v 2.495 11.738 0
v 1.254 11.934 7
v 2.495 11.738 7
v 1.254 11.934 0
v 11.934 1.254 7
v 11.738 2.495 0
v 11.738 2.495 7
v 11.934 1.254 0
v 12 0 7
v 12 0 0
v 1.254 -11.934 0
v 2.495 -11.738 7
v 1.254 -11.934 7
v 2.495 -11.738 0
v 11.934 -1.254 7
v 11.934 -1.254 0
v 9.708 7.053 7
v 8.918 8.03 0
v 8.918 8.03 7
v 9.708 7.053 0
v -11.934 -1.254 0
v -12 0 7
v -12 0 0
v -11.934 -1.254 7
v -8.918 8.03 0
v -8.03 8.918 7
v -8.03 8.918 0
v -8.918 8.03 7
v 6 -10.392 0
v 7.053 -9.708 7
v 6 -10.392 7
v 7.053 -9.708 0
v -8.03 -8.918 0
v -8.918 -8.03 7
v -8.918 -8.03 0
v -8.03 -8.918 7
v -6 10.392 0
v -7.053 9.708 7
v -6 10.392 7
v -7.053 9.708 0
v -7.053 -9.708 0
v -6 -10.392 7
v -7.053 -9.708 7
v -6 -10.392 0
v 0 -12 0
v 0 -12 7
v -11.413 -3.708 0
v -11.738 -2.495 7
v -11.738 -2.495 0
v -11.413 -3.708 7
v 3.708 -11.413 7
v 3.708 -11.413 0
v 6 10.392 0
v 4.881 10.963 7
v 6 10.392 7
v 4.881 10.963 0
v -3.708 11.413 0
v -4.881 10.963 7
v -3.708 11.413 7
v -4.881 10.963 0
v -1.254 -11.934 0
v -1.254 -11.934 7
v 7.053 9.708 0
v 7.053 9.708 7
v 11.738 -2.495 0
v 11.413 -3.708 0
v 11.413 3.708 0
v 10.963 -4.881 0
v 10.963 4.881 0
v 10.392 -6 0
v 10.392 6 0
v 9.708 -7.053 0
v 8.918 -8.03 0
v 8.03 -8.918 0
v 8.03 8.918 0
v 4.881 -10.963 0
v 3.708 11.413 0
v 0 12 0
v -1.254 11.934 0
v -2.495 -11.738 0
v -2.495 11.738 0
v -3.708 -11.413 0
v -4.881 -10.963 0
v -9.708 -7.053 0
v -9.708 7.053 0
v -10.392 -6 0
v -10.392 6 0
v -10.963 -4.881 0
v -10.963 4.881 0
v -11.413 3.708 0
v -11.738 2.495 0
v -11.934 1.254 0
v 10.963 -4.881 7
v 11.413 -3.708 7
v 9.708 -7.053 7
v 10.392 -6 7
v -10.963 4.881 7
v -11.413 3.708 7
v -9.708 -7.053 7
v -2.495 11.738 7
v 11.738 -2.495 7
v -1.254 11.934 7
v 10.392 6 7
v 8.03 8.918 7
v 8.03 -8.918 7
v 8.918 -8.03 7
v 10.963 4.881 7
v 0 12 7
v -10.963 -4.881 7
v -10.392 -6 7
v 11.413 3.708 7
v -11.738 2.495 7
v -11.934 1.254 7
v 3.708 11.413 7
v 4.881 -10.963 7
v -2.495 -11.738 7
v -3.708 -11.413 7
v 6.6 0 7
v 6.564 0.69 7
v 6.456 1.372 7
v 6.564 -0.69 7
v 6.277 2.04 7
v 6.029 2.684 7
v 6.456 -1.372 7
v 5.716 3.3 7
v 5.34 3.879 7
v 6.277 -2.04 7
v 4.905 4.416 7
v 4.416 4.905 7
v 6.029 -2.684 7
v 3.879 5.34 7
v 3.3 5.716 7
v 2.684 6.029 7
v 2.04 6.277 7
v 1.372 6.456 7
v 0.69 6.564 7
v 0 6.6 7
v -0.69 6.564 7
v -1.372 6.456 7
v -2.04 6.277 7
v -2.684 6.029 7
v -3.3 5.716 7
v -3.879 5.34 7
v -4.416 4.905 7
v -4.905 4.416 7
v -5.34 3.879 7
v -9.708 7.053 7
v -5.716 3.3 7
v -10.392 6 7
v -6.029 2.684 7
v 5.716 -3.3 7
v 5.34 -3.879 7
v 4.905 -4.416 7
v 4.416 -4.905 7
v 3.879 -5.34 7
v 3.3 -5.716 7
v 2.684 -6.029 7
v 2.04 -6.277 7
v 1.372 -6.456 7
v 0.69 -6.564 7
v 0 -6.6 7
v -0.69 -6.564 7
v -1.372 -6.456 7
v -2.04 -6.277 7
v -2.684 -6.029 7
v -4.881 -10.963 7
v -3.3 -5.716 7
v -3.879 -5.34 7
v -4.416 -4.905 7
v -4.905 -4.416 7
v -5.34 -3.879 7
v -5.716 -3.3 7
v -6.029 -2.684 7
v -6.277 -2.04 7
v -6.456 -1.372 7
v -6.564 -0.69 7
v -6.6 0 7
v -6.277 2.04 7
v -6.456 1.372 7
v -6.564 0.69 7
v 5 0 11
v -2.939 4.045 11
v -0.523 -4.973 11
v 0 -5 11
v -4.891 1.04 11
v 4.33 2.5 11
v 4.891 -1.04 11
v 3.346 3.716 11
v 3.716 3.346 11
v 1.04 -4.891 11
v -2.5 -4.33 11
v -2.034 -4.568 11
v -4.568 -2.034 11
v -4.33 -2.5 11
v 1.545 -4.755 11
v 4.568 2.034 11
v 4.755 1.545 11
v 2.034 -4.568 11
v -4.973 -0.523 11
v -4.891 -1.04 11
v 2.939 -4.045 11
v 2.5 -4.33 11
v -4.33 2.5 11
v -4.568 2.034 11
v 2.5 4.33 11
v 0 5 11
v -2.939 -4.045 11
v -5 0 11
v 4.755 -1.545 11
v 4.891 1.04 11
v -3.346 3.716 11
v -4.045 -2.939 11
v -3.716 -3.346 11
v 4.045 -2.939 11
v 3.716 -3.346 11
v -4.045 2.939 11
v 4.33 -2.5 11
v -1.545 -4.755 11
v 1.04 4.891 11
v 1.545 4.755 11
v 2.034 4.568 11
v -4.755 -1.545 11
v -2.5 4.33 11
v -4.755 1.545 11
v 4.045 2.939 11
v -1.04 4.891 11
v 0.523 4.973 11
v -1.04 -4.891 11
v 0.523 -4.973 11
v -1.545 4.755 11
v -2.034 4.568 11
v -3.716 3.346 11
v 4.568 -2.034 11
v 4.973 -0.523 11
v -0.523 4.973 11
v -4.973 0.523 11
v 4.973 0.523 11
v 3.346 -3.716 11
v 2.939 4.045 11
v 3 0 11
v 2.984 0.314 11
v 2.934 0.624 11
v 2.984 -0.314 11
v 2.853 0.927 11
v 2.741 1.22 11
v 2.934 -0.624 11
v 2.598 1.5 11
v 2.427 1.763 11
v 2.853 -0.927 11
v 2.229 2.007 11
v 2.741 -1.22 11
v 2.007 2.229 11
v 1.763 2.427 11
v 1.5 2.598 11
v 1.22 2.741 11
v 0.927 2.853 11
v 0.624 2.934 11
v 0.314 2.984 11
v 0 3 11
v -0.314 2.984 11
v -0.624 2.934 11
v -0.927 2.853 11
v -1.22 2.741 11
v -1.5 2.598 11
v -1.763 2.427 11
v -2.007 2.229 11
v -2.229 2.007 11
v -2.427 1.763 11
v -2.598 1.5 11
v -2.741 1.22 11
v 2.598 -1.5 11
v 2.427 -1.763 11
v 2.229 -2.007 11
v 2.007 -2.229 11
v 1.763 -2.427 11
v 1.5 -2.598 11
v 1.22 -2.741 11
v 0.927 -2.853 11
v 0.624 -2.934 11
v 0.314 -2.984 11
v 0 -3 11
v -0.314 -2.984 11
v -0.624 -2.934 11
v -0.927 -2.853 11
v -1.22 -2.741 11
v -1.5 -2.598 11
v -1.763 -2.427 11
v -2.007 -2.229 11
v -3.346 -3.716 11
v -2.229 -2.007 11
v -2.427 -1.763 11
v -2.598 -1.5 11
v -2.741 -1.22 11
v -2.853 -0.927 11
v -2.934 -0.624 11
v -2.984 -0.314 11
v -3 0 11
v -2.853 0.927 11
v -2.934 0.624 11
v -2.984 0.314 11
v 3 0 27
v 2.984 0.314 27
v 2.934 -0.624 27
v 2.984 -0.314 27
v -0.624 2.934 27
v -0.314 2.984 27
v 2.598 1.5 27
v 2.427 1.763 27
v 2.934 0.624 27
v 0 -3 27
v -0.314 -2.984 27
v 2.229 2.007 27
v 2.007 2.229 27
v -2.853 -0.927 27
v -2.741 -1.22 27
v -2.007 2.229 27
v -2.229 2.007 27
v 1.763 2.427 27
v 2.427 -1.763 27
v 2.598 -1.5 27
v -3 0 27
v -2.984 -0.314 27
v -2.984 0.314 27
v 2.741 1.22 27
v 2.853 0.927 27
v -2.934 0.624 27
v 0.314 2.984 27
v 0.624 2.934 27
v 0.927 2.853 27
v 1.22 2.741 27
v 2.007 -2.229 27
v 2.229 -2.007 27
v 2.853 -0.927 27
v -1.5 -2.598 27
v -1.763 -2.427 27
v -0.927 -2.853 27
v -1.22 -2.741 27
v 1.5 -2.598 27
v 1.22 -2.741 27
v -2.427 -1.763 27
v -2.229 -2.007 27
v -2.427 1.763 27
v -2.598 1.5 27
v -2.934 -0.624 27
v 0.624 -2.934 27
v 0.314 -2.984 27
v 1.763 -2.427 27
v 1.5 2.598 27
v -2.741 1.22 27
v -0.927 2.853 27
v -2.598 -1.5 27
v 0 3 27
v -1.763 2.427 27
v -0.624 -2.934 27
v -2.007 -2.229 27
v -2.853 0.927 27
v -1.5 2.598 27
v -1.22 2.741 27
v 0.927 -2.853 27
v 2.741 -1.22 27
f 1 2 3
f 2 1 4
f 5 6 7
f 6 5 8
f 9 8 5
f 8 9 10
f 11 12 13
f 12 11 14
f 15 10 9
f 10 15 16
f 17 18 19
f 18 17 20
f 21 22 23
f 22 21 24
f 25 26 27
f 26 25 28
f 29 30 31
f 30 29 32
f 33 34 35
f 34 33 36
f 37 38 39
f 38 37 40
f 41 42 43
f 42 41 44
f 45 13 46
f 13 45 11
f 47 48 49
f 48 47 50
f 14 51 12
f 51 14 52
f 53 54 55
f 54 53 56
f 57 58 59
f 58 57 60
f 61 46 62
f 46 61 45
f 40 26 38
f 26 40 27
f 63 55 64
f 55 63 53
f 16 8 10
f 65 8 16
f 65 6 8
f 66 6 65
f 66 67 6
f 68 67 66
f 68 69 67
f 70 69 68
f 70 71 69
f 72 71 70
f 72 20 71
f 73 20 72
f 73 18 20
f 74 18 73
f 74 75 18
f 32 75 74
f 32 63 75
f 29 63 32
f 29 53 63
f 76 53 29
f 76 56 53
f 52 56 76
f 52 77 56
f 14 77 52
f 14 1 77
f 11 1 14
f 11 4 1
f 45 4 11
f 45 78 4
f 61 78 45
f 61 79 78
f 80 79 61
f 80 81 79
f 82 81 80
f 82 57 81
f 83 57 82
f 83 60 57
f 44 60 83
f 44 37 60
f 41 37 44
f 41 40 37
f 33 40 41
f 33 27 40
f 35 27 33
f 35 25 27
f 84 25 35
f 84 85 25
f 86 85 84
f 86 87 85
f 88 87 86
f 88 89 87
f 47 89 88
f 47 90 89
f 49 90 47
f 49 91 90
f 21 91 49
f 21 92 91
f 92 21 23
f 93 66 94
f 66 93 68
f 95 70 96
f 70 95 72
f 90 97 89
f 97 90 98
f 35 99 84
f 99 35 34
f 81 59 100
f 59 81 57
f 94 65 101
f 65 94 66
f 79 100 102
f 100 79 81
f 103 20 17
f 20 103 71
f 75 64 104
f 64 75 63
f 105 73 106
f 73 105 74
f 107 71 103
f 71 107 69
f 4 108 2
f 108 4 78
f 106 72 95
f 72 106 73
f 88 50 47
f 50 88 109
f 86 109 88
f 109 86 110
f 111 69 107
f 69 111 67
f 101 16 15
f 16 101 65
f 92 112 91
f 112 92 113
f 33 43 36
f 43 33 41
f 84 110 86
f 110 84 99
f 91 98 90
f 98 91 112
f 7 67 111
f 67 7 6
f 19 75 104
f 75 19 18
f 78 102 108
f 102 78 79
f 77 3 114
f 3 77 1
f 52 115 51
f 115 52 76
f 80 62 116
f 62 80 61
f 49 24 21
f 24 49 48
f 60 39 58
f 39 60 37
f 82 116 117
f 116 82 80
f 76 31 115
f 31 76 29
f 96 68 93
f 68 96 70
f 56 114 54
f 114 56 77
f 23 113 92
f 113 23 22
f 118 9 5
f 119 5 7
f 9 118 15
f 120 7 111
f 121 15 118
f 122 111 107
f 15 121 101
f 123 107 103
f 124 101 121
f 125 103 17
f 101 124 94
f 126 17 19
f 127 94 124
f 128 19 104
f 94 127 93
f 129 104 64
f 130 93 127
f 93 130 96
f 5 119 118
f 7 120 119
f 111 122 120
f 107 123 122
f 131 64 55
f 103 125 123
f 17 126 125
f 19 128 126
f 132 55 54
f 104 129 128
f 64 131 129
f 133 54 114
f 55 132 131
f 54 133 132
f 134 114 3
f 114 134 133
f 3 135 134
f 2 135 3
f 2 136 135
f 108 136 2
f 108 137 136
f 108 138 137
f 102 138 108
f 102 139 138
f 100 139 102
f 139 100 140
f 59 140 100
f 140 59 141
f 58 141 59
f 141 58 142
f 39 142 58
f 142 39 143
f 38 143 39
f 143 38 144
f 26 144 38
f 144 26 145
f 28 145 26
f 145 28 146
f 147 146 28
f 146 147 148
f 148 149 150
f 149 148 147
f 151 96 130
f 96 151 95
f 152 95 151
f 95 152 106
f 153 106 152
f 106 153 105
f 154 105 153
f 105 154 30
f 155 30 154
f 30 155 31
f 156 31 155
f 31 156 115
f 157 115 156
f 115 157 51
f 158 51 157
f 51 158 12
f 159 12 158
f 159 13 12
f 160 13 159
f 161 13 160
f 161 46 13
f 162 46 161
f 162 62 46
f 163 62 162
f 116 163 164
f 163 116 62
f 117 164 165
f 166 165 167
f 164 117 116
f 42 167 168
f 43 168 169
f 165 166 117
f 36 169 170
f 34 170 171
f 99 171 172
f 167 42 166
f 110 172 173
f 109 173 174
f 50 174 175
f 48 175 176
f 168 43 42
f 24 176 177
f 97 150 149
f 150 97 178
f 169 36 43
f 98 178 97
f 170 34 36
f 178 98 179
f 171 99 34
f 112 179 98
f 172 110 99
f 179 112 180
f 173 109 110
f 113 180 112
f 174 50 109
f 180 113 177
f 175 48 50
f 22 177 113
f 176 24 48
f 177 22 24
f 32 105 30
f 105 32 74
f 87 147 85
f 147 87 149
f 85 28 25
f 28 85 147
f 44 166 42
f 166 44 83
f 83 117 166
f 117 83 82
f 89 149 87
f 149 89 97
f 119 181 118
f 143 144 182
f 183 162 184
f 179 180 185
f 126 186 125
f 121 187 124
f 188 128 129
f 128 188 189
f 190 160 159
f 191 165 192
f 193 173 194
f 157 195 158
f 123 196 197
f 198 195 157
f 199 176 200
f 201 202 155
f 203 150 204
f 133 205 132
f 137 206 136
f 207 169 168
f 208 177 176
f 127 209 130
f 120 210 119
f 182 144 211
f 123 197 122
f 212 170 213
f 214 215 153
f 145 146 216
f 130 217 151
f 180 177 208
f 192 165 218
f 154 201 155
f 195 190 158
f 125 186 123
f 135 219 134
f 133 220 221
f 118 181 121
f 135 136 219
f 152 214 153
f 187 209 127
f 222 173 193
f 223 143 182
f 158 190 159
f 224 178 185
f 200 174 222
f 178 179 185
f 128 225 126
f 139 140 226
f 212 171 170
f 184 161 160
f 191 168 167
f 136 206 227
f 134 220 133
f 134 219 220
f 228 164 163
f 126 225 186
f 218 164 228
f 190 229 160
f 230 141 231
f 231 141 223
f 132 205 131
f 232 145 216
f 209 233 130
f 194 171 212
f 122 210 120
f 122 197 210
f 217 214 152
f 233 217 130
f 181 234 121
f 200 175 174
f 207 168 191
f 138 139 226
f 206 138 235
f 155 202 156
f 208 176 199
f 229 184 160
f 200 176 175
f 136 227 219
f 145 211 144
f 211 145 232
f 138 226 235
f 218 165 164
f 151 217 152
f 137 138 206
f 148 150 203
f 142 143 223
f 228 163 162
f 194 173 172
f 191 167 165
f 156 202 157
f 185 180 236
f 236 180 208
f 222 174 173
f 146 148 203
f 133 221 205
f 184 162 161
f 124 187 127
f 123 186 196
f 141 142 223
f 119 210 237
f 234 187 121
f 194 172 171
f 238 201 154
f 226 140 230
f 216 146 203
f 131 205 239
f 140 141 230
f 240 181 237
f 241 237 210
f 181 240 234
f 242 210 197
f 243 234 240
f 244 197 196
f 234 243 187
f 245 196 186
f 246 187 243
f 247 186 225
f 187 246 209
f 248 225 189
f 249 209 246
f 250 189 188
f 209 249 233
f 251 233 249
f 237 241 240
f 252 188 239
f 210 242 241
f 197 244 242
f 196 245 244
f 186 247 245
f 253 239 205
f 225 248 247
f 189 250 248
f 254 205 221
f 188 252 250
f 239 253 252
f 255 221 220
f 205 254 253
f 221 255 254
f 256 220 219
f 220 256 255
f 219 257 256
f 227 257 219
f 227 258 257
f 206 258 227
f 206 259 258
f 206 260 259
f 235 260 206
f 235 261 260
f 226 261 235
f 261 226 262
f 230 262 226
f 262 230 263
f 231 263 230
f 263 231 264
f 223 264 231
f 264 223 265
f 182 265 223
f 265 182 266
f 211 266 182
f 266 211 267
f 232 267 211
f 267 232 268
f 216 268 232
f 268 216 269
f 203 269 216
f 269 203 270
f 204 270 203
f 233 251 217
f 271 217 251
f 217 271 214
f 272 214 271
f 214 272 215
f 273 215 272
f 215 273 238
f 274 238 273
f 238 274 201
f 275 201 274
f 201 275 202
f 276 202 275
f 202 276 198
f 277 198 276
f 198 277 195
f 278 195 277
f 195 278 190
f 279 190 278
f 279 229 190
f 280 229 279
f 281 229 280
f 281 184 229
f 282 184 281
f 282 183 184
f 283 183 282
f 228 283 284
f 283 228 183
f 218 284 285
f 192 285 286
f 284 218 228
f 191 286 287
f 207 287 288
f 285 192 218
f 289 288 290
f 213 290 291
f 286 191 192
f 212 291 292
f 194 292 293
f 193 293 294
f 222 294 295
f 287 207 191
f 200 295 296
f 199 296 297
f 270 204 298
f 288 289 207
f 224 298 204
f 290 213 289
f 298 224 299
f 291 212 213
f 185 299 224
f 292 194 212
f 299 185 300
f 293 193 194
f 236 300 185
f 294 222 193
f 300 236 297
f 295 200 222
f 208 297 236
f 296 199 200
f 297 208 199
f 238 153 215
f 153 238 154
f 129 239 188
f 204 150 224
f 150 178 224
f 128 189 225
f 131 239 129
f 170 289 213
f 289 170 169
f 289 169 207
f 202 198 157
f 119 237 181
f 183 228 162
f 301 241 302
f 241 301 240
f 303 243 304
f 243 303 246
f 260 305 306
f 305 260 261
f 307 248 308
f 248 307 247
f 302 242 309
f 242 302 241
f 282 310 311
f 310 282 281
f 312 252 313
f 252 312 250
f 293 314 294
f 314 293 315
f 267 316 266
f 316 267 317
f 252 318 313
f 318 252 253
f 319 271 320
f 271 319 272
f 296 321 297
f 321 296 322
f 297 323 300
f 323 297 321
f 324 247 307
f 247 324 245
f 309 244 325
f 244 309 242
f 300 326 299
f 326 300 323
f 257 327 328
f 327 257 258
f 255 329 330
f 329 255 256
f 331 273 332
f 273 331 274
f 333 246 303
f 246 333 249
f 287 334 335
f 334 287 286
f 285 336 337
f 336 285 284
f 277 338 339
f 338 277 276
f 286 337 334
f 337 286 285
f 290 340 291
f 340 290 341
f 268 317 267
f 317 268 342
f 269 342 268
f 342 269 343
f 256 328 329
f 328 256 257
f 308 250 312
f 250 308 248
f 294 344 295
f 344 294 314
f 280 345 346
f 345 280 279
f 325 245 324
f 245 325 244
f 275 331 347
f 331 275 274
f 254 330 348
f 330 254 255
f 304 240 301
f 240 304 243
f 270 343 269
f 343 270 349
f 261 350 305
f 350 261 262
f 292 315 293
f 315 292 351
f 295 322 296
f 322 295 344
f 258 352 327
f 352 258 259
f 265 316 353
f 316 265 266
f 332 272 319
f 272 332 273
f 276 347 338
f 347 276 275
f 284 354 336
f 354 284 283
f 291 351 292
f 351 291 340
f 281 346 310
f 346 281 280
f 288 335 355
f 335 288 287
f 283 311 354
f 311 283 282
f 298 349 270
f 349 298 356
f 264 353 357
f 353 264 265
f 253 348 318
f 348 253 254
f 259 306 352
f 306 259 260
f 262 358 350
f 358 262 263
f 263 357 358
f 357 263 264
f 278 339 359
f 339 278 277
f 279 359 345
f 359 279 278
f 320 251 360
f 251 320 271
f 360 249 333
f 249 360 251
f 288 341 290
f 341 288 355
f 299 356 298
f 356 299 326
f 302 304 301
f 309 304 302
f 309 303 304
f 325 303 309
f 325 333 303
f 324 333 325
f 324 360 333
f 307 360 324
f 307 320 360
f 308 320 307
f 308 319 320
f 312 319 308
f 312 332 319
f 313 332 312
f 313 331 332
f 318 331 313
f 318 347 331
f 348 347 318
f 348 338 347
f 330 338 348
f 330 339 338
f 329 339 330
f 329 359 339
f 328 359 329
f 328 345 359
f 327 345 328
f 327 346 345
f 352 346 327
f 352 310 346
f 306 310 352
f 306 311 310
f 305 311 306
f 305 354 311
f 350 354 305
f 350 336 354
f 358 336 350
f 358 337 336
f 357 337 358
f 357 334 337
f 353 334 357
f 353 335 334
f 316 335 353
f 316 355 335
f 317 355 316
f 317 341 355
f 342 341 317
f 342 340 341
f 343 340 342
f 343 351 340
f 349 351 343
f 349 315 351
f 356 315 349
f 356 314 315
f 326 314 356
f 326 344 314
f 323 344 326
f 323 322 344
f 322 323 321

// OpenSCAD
// Adjustable leveling foot, smooth threaded-shaft representation.
$fn = 60;
eps = 0.02;
shaft_d = 6;
pad_d = 24;
shaft_l = 16;
pad_h = 7;
union() {
    cylinder(d = pad_d, h = pad_h);
    translate([0, 0, pad_h]) cylinder(d1 = pad_d * 0.55, d2 = shaft_d + 4, h = 4);
    translate([0, 0, pad_h + 4]) cylinder(d = shaft_d, h = shaft_l);
}
